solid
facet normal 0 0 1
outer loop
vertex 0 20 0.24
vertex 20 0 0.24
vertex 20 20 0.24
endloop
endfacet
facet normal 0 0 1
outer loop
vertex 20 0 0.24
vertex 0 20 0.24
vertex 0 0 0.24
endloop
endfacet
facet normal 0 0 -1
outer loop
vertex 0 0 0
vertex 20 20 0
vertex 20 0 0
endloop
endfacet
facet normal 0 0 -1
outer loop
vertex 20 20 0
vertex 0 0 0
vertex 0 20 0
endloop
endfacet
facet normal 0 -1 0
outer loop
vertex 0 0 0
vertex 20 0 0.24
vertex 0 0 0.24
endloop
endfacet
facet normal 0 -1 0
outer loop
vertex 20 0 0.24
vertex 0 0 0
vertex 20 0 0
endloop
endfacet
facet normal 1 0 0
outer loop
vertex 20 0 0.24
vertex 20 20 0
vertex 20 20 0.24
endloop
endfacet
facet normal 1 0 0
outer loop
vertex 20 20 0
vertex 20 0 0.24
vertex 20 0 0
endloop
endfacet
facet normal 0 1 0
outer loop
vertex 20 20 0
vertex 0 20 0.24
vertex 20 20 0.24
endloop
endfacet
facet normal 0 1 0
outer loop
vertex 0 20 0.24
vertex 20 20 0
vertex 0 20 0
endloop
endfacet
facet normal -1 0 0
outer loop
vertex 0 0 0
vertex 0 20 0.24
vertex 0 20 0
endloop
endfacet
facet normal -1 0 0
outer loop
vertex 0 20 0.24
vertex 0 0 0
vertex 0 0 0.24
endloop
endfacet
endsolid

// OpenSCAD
SQUARE_COUNT = 1;
SQUARE_SIZE = 20;

NOZZLE_DIAMETER = 0.4;
LAYER_HEIGHT = 2.4 / 4 * NOZZLE_DIAMETER;
echo("LAYER_HEIGHT:", LAYER_HEIGHT);

module squares()
{
    grid_rows = floor(sqrt(SQUARE_COUNT));
    grid_cols = ceil(SQUARE_COUNT / grid_rows);
    echo("grid_rows:", grid_rows);
    echo("SQUARE_COUNT:", SQUARE_COUNT);
    modulo = SQUARE_COUNT % grid_rows;
    echo("modulo:", modulo);

    for (i = [0:grid_cols - 1])
    {
        itLimit = i != grid_rows - 1 || modulo == 0 ? grid_rows : modulo;
        echo("itLimit:", itLimit);

        for (j = [0:itLimit - 1])
        {
            translate([ j * SQUARE_SIZE * 2, i * SQUARE_SIZE * 2, 0 ]) cube([ SQUARE_SIZE, SQUARE_SIZE, LAYER_HEIGHT ]);
        }
        // grid should be the square root of the square size and iterate in both directions
        // place squares in a grid by translating x and y

        // translate([ i * SQUARE_SIZE * 2, i * SQUARE_SIZE * 2, 0 ]) square();
        // translate([ i * SQUARE_SIZE * 2, 0, 0 ]) square();
    }
}

squares();
